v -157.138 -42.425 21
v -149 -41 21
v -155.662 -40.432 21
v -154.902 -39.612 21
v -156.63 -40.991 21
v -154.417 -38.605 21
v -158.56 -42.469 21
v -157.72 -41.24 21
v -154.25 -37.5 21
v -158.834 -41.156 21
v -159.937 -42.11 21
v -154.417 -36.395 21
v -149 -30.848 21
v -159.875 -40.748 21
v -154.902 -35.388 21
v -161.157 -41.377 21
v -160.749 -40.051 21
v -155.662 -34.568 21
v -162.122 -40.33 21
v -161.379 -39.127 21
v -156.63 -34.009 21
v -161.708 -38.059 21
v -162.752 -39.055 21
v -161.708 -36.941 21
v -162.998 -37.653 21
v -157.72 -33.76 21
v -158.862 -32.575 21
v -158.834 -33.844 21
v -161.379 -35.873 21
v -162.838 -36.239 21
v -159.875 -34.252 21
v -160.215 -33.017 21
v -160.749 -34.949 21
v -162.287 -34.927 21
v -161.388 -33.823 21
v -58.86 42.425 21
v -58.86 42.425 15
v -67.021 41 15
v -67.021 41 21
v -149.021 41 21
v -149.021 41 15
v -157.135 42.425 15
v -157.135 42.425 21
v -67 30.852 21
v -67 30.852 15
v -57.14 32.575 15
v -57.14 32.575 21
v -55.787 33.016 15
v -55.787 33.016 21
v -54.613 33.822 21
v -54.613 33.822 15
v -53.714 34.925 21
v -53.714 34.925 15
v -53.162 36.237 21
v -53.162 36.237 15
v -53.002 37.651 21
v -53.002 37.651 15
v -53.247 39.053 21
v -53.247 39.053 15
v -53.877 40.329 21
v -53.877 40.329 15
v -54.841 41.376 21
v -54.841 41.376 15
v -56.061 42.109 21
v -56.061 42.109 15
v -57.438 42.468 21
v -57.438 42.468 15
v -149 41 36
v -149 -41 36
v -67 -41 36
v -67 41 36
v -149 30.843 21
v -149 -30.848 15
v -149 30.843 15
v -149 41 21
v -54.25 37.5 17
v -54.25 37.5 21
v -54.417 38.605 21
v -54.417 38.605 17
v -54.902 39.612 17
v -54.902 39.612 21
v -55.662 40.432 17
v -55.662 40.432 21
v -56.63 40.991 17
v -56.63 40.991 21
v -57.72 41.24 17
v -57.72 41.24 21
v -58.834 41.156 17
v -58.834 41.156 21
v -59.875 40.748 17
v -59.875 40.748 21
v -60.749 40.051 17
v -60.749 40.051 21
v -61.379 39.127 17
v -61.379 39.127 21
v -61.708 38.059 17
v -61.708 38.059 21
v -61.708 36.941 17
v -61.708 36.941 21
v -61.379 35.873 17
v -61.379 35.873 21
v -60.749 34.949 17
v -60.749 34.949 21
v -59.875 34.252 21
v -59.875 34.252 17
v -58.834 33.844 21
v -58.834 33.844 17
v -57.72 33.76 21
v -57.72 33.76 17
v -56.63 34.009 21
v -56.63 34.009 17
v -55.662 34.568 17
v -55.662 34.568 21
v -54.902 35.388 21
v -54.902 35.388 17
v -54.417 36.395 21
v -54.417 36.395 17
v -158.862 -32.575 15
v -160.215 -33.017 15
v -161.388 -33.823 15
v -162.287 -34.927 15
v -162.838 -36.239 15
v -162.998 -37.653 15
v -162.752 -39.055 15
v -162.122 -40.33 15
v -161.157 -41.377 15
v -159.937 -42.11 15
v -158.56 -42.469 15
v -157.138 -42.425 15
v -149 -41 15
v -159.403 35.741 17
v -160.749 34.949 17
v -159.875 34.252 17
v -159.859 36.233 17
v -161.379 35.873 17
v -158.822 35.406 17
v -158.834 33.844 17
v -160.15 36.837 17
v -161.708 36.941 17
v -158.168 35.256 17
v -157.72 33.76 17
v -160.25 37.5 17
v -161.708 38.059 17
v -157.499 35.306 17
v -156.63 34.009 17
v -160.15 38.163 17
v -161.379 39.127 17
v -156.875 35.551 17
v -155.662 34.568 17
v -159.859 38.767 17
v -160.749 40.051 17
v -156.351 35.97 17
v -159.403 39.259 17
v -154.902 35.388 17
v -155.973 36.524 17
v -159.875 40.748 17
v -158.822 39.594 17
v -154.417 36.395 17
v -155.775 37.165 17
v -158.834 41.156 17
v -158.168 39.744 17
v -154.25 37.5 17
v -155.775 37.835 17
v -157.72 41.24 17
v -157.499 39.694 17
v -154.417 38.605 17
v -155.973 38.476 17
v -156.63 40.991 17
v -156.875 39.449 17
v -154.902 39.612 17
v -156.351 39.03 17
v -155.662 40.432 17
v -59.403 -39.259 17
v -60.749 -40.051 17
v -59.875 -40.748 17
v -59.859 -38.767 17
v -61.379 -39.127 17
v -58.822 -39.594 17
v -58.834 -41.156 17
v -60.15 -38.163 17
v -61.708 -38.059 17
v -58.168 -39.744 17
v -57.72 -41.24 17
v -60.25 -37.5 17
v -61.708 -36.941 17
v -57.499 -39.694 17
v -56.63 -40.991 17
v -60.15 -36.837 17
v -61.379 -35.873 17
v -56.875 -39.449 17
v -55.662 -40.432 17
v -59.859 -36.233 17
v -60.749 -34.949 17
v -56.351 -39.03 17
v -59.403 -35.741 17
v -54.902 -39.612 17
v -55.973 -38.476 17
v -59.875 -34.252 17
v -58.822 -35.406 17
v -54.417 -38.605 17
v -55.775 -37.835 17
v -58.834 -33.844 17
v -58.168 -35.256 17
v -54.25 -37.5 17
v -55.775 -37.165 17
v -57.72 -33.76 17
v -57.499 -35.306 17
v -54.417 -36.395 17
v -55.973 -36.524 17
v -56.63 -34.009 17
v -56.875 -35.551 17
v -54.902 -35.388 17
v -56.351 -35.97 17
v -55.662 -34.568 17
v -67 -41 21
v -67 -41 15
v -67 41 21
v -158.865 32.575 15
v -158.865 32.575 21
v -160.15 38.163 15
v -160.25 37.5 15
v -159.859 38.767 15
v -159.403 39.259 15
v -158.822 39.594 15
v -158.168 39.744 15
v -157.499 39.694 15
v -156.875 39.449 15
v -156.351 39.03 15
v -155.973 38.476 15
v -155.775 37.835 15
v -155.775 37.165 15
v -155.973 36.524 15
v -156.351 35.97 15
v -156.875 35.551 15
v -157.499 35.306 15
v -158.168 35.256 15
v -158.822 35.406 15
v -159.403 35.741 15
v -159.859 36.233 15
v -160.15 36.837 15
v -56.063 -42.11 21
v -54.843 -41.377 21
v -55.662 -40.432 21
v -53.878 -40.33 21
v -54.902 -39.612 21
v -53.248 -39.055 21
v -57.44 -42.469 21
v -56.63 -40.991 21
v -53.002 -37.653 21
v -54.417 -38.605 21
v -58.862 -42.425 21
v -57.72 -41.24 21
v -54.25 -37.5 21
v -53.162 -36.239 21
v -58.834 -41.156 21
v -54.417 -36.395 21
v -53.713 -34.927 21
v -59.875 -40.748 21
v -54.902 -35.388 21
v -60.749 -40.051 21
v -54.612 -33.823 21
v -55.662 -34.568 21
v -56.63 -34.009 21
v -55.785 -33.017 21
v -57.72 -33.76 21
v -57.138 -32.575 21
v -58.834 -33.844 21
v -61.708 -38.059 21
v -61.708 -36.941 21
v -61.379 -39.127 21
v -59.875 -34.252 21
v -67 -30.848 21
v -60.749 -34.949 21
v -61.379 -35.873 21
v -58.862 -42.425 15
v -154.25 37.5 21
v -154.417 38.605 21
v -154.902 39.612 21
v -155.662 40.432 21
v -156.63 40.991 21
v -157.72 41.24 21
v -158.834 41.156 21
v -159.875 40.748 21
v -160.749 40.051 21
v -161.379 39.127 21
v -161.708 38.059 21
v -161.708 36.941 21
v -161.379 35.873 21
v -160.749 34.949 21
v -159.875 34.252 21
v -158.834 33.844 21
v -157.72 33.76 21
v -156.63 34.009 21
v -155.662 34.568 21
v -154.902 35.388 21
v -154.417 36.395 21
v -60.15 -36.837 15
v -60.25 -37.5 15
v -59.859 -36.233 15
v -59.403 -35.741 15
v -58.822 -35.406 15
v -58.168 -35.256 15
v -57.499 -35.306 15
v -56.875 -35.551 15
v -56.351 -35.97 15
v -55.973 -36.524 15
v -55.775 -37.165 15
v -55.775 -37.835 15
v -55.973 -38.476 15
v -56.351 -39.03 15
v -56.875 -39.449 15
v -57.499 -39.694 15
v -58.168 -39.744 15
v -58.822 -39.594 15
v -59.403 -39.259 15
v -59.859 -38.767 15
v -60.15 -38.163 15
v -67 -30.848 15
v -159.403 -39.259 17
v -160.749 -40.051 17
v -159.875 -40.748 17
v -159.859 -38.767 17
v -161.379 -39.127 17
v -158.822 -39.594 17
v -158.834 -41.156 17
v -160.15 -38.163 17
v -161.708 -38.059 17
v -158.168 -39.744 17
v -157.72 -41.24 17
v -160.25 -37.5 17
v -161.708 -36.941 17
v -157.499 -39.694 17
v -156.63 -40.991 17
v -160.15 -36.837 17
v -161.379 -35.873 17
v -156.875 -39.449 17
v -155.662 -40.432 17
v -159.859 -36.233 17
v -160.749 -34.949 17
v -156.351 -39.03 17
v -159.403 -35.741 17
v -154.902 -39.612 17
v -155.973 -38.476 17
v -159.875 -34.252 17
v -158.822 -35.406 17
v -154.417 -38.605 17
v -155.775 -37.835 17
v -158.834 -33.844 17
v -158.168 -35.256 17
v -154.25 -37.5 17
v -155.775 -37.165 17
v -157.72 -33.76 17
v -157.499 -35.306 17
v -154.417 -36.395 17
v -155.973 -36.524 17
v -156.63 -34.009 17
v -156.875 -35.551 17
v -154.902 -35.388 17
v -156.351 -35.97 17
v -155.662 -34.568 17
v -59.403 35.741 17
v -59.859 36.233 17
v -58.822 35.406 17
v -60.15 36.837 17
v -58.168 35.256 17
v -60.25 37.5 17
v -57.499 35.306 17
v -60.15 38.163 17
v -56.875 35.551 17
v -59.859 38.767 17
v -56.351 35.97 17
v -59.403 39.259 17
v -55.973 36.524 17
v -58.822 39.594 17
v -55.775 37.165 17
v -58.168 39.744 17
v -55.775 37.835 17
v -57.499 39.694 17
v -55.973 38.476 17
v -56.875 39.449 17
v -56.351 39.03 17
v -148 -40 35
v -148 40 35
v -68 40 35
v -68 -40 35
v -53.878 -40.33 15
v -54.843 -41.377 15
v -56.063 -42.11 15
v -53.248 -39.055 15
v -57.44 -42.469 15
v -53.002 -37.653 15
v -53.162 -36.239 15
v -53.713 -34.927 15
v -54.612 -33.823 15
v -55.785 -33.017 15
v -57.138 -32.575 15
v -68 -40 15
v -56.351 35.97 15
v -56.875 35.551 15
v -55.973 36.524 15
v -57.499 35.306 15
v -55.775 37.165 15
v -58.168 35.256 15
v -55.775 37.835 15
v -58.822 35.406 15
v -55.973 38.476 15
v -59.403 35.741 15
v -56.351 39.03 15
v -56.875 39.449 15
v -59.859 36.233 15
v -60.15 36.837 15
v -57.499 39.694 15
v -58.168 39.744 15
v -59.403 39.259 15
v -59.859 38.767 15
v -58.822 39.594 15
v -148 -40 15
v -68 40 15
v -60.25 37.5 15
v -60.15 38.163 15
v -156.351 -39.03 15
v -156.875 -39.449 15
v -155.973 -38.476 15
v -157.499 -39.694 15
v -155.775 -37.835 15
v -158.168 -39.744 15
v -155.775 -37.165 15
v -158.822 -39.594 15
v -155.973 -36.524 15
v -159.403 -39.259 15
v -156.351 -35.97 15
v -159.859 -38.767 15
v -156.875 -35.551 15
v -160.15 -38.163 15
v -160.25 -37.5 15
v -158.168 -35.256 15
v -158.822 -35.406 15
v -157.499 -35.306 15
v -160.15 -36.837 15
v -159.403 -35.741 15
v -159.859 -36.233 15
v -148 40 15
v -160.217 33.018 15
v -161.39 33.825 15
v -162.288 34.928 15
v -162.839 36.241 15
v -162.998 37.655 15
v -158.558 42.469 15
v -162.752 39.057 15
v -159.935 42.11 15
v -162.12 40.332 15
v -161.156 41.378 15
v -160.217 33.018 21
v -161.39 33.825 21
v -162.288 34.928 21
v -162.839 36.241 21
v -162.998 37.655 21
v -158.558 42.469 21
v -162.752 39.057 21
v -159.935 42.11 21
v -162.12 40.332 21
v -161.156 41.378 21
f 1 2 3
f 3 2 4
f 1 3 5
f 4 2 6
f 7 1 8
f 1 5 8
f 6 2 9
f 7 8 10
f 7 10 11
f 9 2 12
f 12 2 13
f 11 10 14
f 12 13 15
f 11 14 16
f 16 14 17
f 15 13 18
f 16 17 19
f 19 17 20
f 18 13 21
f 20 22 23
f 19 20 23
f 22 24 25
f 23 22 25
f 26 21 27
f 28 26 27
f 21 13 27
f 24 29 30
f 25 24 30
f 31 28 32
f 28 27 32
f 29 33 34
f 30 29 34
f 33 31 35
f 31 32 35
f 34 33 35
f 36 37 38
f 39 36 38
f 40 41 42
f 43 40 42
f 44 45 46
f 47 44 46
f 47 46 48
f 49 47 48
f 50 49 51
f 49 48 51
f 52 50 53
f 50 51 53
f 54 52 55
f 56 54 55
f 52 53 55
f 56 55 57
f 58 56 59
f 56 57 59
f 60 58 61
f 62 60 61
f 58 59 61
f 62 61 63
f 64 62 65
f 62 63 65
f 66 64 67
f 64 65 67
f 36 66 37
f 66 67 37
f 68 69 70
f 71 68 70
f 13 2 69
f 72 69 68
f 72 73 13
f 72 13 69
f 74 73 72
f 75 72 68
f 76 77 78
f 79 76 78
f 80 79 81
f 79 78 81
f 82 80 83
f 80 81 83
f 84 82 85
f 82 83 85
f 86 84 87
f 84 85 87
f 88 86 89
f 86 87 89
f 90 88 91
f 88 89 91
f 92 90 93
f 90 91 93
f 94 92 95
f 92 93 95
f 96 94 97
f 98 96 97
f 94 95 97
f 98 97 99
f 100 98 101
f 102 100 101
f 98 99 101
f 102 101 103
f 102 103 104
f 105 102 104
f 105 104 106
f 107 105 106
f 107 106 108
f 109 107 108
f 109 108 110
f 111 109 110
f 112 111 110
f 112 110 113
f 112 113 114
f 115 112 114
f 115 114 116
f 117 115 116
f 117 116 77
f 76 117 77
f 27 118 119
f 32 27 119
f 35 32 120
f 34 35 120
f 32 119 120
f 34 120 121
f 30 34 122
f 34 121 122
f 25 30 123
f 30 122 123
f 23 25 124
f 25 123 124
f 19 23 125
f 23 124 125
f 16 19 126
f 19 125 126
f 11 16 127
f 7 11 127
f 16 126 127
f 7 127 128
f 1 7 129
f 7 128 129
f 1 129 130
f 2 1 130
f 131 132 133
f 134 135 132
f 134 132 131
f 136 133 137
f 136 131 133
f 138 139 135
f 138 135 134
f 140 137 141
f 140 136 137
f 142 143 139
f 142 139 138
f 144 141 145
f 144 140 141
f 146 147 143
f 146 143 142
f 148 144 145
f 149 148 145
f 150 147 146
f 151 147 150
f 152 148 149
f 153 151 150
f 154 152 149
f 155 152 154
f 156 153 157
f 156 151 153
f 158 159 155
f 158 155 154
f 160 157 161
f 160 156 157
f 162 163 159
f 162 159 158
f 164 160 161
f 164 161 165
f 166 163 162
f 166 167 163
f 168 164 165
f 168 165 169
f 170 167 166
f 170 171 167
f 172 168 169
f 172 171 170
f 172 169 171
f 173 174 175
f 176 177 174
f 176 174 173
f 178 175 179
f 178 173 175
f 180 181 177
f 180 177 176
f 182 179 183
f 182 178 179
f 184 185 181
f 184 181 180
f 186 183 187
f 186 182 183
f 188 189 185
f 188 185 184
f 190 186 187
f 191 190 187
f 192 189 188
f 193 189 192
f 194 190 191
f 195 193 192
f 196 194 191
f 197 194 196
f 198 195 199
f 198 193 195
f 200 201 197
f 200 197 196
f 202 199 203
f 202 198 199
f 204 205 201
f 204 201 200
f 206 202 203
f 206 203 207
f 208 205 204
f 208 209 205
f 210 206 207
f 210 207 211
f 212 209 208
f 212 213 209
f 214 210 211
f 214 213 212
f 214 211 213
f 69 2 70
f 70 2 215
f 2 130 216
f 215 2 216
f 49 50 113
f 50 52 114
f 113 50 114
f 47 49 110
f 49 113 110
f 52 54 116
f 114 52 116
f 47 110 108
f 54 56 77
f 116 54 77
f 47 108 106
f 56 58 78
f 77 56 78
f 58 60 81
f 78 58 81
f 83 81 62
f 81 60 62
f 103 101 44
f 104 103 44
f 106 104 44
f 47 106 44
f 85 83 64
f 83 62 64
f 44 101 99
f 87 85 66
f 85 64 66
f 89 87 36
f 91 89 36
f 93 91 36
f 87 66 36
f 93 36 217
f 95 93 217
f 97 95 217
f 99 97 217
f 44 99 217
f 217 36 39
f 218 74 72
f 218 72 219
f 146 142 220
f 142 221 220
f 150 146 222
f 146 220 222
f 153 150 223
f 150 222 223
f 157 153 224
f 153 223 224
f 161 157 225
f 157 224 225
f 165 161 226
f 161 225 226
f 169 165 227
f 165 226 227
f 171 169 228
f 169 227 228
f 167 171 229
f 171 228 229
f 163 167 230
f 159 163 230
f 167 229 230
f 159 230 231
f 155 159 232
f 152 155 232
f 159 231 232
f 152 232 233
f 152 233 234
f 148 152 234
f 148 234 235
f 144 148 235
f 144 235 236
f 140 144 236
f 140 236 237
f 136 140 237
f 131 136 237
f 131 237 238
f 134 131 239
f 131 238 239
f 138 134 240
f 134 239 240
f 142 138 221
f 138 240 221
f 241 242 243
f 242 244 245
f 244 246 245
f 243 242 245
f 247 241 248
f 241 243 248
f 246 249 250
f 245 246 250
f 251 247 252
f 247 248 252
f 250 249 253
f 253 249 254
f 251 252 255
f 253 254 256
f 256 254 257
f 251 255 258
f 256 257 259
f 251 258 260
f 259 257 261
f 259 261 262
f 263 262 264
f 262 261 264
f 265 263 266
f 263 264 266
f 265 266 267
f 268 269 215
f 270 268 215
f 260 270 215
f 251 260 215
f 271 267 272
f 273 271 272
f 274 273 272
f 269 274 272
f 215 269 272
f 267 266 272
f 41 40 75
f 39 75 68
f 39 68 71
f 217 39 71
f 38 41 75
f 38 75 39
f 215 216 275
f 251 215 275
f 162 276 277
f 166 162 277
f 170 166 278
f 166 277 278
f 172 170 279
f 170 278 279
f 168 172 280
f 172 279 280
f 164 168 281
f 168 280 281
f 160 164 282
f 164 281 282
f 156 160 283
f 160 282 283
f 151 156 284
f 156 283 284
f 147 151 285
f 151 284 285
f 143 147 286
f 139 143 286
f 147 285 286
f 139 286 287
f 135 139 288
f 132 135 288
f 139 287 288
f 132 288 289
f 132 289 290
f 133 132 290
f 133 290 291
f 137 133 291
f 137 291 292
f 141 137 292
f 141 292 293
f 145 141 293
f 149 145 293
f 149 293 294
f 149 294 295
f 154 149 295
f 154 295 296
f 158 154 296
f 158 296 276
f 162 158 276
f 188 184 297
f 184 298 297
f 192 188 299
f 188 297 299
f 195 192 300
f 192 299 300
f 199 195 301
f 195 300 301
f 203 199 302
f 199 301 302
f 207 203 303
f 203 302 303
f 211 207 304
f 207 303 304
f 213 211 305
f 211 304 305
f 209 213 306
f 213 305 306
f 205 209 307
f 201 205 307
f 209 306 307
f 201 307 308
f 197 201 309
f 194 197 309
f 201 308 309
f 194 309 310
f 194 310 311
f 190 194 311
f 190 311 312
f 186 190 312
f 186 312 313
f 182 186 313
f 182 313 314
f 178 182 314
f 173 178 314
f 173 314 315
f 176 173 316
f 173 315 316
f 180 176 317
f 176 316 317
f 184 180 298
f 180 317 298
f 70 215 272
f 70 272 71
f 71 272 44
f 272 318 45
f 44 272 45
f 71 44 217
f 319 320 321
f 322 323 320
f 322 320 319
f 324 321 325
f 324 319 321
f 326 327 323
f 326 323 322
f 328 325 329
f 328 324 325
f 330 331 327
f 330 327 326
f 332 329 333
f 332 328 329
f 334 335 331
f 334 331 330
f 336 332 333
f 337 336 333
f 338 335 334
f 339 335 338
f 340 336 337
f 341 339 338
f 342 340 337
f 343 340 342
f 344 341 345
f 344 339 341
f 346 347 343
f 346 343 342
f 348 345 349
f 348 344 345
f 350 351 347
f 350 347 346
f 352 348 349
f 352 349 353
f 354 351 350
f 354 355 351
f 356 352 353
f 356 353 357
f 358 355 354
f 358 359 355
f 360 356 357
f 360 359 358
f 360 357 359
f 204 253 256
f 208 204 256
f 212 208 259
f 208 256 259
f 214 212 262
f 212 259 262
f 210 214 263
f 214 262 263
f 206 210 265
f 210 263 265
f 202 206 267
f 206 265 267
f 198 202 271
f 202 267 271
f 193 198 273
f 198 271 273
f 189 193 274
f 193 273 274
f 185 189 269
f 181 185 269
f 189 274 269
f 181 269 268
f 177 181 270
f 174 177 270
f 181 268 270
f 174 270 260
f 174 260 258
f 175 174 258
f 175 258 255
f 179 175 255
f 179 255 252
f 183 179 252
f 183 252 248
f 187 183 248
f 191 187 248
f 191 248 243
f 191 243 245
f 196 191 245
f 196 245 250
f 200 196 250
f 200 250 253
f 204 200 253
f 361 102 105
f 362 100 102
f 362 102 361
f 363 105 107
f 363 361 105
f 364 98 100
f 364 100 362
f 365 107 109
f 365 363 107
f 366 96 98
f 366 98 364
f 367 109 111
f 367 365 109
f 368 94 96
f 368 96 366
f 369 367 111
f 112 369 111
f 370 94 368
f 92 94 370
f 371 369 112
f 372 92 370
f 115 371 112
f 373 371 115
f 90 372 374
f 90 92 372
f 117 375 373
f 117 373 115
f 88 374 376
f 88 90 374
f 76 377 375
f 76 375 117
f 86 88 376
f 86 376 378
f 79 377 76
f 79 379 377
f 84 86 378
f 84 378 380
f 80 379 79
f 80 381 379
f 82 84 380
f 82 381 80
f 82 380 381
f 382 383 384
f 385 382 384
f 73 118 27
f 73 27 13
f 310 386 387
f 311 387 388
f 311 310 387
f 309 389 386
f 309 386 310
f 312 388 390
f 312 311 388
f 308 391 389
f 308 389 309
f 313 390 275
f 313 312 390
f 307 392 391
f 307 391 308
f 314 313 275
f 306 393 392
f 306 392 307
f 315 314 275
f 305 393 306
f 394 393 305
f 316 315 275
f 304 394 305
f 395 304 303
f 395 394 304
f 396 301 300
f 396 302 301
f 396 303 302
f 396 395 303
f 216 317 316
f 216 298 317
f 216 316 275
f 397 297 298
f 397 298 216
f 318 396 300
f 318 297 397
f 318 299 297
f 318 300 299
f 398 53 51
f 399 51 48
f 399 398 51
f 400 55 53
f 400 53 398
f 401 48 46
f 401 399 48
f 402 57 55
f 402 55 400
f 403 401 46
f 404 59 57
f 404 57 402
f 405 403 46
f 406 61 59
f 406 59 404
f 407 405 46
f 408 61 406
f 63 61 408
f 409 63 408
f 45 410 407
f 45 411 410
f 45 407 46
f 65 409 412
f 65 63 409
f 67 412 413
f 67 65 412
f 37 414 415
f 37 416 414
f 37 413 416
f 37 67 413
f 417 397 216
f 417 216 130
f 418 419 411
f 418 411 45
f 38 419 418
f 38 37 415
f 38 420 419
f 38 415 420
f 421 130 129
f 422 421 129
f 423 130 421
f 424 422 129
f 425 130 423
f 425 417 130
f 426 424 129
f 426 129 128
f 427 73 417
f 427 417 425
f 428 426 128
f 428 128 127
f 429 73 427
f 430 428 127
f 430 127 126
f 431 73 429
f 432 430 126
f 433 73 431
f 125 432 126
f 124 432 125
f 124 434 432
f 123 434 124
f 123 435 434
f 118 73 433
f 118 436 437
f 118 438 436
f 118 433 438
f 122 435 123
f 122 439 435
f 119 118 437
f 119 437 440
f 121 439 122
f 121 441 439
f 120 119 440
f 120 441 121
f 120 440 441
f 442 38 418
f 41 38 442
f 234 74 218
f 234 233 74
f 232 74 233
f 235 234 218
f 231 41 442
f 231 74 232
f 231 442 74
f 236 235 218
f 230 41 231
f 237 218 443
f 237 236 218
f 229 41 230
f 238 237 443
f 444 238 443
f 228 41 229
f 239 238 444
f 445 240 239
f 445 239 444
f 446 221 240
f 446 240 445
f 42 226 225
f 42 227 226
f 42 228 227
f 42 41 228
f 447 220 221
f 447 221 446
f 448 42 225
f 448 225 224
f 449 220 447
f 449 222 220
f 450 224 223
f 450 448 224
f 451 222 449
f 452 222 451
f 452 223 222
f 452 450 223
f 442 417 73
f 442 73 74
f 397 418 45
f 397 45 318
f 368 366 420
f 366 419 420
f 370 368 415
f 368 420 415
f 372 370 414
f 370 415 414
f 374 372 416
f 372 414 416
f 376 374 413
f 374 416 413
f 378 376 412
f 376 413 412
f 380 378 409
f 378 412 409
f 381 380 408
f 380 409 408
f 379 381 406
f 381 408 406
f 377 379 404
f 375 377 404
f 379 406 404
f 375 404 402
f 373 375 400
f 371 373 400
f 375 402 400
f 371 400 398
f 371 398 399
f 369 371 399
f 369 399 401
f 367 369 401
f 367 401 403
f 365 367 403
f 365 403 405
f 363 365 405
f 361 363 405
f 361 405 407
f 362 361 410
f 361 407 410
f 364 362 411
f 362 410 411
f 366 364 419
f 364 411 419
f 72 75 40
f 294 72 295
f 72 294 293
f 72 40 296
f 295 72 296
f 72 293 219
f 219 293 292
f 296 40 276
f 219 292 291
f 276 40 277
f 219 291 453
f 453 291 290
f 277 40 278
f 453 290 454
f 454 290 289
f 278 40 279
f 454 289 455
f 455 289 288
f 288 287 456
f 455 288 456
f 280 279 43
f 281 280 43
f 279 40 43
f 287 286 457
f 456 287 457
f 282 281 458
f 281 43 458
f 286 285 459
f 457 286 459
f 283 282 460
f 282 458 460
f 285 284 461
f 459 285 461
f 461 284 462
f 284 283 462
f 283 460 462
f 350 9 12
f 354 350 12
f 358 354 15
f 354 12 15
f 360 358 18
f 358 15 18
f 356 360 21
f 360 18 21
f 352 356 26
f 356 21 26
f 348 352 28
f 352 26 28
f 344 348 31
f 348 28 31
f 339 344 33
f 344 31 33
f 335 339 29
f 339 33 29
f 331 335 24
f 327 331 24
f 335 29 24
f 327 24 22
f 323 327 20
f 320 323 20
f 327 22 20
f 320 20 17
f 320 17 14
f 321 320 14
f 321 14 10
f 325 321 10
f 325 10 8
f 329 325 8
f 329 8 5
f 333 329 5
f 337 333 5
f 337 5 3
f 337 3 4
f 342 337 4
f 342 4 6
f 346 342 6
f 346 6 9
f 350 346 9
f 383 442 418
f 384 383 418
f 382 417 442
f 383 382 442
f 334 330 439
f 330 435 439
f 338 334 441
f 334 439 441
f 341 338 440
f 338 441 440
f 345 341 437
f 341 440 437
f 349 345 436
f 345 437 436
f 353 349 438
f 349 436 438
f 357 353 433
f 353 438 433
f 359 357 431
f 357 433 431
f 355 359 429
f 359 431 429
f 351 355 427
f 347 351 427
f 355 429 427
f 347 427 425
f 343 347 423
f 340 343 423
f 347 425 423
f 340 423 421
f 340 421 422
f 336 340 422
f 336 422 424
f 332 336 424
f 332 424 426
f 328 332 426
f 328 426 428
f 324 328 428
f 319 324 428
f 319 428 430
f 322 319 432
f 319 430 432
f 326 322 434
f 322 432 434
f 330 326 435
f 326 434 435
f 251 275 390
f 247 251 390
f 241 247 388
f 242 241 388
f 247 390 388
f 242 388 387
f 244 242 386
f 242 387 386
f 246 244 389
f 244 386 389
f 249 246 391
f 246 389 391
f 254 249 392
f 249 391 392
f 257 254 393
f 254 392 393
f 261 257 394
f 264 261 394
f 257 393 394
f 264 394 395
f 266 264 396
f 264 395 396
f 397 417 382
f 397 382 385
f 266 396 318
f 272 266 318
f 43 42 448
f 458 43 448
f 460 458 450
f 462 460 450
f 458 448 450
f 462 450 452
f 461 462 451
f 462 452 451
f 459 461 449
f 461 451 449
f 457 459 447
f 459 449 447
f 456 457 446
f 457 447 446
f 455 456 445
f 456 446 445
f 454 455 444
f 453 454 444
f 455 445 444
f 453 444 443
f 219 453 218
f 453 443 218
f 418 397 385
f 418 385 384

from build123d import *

# Parameters (mm, degrees)
SKETCH218_W         = 80
SKETCH218_H         = 80
PAD096_DEPTH        = 6
SKETCH219_W         = 82
SKETCH219_H         = 82
SKETCH219_W_2       = 80
SKETCH219_H_2       = 80
PAD097_DEPTH        = 20
SKETCH220_W         = 82
SKETCH220_H         = 82
PAD098_DEPTH        = 1
HOLE010_D           = 4.5
HOLE010_DEPTH       = 24
HOLE010_CBORE_D     = 7.5
HOLE010_CBORE_DEPTH = 4


with BuildPart() as part:
    # Sketch218 → Pad096 (new body)
    with BuildSketch(Plane.XY):
        with BuildLine():
            Line((-41.02059, 41), (40.97941, 41))
            Line((49.139632, 42.42542), (40.97941, 41))
            ThreePointArc((50.860368, 32.57458), (54.92542, 38.360368), (49.139632, 42.42542))
            Line((41, 30.852179), (50.860368, 32.57458))
            Line((41, 30.852179), (41, -30.847821))
            Line((50.86248, -32.574949), (41, -30.847821))
            ThreePointArc((49.13752, -42.425051), (54.925051, -38.36248), (50.86248, -32.574949))
            Line((41, -41), (49.13752, -42.425051))
            Line((41, -41), (-41, -41))
            Line((-49.13752, -42.425051), (-41, -41))
            ThreePointArc((-50.86248, -32.574949), (-54.925051, -38.36248), (-49.13752, -42.425051))
            Line((-50.86248, -32.574949), (-41, -30.847821))
            Line((-41, -30.847821), (-41, 30.843439))
            Line((-41, 30.843439), (-50.864603, 32.575321))
            ThreePointArc((-49.135397, 42.424679), (-54.924679, 38.364603), (-50.864603, 32.575321))
            Line((-41.02059, 41), (-49.135397, 42.424679))
        make_face()
        Rectangle(SKETCH218_W, SKETCH218_H, mode=Mode.SUBTRACT)
    extrude(amount=PAD096_DEPTH)

    # Sketch219 → Pad097 (join)
    with BuildSketch(Plane.XY):
        Rectangle(SKETCH219_W, SKETCH219_H)
        Rectangle(SKETCH219_W_2, SKETCH219_H_2, mode=Mode.SUBTRACT)
    extrude(amount=PAD097_DEPTH)

    # Sketch220 (on Face25 of Pad097) → Pad098 (join)
    with BuildSketch(Plane.XY.offset(20)):
        Rectangle(SKETCH220_W, SKETCH220_H)
    extrude(amount=PAD098_DEPTH)

    # Hole010
    with Locations(Plane.XY.offset(6)):
        with Locations((-50, 37.5), (50, 37.5), (50, -37.5), (-50, -37.5)):
            CounterBoreHole(HOLE010_D / 2, HOLE010_CBORE_D / 2, HOLE010_CBORE_DEPTH, depth=HOLE010_DEPTH)


with BuildPart() as part_1:
    # Body026 placement: moved
    add(part.part.moved(Location((-108, 0, 15))))


solid = part_1.part
